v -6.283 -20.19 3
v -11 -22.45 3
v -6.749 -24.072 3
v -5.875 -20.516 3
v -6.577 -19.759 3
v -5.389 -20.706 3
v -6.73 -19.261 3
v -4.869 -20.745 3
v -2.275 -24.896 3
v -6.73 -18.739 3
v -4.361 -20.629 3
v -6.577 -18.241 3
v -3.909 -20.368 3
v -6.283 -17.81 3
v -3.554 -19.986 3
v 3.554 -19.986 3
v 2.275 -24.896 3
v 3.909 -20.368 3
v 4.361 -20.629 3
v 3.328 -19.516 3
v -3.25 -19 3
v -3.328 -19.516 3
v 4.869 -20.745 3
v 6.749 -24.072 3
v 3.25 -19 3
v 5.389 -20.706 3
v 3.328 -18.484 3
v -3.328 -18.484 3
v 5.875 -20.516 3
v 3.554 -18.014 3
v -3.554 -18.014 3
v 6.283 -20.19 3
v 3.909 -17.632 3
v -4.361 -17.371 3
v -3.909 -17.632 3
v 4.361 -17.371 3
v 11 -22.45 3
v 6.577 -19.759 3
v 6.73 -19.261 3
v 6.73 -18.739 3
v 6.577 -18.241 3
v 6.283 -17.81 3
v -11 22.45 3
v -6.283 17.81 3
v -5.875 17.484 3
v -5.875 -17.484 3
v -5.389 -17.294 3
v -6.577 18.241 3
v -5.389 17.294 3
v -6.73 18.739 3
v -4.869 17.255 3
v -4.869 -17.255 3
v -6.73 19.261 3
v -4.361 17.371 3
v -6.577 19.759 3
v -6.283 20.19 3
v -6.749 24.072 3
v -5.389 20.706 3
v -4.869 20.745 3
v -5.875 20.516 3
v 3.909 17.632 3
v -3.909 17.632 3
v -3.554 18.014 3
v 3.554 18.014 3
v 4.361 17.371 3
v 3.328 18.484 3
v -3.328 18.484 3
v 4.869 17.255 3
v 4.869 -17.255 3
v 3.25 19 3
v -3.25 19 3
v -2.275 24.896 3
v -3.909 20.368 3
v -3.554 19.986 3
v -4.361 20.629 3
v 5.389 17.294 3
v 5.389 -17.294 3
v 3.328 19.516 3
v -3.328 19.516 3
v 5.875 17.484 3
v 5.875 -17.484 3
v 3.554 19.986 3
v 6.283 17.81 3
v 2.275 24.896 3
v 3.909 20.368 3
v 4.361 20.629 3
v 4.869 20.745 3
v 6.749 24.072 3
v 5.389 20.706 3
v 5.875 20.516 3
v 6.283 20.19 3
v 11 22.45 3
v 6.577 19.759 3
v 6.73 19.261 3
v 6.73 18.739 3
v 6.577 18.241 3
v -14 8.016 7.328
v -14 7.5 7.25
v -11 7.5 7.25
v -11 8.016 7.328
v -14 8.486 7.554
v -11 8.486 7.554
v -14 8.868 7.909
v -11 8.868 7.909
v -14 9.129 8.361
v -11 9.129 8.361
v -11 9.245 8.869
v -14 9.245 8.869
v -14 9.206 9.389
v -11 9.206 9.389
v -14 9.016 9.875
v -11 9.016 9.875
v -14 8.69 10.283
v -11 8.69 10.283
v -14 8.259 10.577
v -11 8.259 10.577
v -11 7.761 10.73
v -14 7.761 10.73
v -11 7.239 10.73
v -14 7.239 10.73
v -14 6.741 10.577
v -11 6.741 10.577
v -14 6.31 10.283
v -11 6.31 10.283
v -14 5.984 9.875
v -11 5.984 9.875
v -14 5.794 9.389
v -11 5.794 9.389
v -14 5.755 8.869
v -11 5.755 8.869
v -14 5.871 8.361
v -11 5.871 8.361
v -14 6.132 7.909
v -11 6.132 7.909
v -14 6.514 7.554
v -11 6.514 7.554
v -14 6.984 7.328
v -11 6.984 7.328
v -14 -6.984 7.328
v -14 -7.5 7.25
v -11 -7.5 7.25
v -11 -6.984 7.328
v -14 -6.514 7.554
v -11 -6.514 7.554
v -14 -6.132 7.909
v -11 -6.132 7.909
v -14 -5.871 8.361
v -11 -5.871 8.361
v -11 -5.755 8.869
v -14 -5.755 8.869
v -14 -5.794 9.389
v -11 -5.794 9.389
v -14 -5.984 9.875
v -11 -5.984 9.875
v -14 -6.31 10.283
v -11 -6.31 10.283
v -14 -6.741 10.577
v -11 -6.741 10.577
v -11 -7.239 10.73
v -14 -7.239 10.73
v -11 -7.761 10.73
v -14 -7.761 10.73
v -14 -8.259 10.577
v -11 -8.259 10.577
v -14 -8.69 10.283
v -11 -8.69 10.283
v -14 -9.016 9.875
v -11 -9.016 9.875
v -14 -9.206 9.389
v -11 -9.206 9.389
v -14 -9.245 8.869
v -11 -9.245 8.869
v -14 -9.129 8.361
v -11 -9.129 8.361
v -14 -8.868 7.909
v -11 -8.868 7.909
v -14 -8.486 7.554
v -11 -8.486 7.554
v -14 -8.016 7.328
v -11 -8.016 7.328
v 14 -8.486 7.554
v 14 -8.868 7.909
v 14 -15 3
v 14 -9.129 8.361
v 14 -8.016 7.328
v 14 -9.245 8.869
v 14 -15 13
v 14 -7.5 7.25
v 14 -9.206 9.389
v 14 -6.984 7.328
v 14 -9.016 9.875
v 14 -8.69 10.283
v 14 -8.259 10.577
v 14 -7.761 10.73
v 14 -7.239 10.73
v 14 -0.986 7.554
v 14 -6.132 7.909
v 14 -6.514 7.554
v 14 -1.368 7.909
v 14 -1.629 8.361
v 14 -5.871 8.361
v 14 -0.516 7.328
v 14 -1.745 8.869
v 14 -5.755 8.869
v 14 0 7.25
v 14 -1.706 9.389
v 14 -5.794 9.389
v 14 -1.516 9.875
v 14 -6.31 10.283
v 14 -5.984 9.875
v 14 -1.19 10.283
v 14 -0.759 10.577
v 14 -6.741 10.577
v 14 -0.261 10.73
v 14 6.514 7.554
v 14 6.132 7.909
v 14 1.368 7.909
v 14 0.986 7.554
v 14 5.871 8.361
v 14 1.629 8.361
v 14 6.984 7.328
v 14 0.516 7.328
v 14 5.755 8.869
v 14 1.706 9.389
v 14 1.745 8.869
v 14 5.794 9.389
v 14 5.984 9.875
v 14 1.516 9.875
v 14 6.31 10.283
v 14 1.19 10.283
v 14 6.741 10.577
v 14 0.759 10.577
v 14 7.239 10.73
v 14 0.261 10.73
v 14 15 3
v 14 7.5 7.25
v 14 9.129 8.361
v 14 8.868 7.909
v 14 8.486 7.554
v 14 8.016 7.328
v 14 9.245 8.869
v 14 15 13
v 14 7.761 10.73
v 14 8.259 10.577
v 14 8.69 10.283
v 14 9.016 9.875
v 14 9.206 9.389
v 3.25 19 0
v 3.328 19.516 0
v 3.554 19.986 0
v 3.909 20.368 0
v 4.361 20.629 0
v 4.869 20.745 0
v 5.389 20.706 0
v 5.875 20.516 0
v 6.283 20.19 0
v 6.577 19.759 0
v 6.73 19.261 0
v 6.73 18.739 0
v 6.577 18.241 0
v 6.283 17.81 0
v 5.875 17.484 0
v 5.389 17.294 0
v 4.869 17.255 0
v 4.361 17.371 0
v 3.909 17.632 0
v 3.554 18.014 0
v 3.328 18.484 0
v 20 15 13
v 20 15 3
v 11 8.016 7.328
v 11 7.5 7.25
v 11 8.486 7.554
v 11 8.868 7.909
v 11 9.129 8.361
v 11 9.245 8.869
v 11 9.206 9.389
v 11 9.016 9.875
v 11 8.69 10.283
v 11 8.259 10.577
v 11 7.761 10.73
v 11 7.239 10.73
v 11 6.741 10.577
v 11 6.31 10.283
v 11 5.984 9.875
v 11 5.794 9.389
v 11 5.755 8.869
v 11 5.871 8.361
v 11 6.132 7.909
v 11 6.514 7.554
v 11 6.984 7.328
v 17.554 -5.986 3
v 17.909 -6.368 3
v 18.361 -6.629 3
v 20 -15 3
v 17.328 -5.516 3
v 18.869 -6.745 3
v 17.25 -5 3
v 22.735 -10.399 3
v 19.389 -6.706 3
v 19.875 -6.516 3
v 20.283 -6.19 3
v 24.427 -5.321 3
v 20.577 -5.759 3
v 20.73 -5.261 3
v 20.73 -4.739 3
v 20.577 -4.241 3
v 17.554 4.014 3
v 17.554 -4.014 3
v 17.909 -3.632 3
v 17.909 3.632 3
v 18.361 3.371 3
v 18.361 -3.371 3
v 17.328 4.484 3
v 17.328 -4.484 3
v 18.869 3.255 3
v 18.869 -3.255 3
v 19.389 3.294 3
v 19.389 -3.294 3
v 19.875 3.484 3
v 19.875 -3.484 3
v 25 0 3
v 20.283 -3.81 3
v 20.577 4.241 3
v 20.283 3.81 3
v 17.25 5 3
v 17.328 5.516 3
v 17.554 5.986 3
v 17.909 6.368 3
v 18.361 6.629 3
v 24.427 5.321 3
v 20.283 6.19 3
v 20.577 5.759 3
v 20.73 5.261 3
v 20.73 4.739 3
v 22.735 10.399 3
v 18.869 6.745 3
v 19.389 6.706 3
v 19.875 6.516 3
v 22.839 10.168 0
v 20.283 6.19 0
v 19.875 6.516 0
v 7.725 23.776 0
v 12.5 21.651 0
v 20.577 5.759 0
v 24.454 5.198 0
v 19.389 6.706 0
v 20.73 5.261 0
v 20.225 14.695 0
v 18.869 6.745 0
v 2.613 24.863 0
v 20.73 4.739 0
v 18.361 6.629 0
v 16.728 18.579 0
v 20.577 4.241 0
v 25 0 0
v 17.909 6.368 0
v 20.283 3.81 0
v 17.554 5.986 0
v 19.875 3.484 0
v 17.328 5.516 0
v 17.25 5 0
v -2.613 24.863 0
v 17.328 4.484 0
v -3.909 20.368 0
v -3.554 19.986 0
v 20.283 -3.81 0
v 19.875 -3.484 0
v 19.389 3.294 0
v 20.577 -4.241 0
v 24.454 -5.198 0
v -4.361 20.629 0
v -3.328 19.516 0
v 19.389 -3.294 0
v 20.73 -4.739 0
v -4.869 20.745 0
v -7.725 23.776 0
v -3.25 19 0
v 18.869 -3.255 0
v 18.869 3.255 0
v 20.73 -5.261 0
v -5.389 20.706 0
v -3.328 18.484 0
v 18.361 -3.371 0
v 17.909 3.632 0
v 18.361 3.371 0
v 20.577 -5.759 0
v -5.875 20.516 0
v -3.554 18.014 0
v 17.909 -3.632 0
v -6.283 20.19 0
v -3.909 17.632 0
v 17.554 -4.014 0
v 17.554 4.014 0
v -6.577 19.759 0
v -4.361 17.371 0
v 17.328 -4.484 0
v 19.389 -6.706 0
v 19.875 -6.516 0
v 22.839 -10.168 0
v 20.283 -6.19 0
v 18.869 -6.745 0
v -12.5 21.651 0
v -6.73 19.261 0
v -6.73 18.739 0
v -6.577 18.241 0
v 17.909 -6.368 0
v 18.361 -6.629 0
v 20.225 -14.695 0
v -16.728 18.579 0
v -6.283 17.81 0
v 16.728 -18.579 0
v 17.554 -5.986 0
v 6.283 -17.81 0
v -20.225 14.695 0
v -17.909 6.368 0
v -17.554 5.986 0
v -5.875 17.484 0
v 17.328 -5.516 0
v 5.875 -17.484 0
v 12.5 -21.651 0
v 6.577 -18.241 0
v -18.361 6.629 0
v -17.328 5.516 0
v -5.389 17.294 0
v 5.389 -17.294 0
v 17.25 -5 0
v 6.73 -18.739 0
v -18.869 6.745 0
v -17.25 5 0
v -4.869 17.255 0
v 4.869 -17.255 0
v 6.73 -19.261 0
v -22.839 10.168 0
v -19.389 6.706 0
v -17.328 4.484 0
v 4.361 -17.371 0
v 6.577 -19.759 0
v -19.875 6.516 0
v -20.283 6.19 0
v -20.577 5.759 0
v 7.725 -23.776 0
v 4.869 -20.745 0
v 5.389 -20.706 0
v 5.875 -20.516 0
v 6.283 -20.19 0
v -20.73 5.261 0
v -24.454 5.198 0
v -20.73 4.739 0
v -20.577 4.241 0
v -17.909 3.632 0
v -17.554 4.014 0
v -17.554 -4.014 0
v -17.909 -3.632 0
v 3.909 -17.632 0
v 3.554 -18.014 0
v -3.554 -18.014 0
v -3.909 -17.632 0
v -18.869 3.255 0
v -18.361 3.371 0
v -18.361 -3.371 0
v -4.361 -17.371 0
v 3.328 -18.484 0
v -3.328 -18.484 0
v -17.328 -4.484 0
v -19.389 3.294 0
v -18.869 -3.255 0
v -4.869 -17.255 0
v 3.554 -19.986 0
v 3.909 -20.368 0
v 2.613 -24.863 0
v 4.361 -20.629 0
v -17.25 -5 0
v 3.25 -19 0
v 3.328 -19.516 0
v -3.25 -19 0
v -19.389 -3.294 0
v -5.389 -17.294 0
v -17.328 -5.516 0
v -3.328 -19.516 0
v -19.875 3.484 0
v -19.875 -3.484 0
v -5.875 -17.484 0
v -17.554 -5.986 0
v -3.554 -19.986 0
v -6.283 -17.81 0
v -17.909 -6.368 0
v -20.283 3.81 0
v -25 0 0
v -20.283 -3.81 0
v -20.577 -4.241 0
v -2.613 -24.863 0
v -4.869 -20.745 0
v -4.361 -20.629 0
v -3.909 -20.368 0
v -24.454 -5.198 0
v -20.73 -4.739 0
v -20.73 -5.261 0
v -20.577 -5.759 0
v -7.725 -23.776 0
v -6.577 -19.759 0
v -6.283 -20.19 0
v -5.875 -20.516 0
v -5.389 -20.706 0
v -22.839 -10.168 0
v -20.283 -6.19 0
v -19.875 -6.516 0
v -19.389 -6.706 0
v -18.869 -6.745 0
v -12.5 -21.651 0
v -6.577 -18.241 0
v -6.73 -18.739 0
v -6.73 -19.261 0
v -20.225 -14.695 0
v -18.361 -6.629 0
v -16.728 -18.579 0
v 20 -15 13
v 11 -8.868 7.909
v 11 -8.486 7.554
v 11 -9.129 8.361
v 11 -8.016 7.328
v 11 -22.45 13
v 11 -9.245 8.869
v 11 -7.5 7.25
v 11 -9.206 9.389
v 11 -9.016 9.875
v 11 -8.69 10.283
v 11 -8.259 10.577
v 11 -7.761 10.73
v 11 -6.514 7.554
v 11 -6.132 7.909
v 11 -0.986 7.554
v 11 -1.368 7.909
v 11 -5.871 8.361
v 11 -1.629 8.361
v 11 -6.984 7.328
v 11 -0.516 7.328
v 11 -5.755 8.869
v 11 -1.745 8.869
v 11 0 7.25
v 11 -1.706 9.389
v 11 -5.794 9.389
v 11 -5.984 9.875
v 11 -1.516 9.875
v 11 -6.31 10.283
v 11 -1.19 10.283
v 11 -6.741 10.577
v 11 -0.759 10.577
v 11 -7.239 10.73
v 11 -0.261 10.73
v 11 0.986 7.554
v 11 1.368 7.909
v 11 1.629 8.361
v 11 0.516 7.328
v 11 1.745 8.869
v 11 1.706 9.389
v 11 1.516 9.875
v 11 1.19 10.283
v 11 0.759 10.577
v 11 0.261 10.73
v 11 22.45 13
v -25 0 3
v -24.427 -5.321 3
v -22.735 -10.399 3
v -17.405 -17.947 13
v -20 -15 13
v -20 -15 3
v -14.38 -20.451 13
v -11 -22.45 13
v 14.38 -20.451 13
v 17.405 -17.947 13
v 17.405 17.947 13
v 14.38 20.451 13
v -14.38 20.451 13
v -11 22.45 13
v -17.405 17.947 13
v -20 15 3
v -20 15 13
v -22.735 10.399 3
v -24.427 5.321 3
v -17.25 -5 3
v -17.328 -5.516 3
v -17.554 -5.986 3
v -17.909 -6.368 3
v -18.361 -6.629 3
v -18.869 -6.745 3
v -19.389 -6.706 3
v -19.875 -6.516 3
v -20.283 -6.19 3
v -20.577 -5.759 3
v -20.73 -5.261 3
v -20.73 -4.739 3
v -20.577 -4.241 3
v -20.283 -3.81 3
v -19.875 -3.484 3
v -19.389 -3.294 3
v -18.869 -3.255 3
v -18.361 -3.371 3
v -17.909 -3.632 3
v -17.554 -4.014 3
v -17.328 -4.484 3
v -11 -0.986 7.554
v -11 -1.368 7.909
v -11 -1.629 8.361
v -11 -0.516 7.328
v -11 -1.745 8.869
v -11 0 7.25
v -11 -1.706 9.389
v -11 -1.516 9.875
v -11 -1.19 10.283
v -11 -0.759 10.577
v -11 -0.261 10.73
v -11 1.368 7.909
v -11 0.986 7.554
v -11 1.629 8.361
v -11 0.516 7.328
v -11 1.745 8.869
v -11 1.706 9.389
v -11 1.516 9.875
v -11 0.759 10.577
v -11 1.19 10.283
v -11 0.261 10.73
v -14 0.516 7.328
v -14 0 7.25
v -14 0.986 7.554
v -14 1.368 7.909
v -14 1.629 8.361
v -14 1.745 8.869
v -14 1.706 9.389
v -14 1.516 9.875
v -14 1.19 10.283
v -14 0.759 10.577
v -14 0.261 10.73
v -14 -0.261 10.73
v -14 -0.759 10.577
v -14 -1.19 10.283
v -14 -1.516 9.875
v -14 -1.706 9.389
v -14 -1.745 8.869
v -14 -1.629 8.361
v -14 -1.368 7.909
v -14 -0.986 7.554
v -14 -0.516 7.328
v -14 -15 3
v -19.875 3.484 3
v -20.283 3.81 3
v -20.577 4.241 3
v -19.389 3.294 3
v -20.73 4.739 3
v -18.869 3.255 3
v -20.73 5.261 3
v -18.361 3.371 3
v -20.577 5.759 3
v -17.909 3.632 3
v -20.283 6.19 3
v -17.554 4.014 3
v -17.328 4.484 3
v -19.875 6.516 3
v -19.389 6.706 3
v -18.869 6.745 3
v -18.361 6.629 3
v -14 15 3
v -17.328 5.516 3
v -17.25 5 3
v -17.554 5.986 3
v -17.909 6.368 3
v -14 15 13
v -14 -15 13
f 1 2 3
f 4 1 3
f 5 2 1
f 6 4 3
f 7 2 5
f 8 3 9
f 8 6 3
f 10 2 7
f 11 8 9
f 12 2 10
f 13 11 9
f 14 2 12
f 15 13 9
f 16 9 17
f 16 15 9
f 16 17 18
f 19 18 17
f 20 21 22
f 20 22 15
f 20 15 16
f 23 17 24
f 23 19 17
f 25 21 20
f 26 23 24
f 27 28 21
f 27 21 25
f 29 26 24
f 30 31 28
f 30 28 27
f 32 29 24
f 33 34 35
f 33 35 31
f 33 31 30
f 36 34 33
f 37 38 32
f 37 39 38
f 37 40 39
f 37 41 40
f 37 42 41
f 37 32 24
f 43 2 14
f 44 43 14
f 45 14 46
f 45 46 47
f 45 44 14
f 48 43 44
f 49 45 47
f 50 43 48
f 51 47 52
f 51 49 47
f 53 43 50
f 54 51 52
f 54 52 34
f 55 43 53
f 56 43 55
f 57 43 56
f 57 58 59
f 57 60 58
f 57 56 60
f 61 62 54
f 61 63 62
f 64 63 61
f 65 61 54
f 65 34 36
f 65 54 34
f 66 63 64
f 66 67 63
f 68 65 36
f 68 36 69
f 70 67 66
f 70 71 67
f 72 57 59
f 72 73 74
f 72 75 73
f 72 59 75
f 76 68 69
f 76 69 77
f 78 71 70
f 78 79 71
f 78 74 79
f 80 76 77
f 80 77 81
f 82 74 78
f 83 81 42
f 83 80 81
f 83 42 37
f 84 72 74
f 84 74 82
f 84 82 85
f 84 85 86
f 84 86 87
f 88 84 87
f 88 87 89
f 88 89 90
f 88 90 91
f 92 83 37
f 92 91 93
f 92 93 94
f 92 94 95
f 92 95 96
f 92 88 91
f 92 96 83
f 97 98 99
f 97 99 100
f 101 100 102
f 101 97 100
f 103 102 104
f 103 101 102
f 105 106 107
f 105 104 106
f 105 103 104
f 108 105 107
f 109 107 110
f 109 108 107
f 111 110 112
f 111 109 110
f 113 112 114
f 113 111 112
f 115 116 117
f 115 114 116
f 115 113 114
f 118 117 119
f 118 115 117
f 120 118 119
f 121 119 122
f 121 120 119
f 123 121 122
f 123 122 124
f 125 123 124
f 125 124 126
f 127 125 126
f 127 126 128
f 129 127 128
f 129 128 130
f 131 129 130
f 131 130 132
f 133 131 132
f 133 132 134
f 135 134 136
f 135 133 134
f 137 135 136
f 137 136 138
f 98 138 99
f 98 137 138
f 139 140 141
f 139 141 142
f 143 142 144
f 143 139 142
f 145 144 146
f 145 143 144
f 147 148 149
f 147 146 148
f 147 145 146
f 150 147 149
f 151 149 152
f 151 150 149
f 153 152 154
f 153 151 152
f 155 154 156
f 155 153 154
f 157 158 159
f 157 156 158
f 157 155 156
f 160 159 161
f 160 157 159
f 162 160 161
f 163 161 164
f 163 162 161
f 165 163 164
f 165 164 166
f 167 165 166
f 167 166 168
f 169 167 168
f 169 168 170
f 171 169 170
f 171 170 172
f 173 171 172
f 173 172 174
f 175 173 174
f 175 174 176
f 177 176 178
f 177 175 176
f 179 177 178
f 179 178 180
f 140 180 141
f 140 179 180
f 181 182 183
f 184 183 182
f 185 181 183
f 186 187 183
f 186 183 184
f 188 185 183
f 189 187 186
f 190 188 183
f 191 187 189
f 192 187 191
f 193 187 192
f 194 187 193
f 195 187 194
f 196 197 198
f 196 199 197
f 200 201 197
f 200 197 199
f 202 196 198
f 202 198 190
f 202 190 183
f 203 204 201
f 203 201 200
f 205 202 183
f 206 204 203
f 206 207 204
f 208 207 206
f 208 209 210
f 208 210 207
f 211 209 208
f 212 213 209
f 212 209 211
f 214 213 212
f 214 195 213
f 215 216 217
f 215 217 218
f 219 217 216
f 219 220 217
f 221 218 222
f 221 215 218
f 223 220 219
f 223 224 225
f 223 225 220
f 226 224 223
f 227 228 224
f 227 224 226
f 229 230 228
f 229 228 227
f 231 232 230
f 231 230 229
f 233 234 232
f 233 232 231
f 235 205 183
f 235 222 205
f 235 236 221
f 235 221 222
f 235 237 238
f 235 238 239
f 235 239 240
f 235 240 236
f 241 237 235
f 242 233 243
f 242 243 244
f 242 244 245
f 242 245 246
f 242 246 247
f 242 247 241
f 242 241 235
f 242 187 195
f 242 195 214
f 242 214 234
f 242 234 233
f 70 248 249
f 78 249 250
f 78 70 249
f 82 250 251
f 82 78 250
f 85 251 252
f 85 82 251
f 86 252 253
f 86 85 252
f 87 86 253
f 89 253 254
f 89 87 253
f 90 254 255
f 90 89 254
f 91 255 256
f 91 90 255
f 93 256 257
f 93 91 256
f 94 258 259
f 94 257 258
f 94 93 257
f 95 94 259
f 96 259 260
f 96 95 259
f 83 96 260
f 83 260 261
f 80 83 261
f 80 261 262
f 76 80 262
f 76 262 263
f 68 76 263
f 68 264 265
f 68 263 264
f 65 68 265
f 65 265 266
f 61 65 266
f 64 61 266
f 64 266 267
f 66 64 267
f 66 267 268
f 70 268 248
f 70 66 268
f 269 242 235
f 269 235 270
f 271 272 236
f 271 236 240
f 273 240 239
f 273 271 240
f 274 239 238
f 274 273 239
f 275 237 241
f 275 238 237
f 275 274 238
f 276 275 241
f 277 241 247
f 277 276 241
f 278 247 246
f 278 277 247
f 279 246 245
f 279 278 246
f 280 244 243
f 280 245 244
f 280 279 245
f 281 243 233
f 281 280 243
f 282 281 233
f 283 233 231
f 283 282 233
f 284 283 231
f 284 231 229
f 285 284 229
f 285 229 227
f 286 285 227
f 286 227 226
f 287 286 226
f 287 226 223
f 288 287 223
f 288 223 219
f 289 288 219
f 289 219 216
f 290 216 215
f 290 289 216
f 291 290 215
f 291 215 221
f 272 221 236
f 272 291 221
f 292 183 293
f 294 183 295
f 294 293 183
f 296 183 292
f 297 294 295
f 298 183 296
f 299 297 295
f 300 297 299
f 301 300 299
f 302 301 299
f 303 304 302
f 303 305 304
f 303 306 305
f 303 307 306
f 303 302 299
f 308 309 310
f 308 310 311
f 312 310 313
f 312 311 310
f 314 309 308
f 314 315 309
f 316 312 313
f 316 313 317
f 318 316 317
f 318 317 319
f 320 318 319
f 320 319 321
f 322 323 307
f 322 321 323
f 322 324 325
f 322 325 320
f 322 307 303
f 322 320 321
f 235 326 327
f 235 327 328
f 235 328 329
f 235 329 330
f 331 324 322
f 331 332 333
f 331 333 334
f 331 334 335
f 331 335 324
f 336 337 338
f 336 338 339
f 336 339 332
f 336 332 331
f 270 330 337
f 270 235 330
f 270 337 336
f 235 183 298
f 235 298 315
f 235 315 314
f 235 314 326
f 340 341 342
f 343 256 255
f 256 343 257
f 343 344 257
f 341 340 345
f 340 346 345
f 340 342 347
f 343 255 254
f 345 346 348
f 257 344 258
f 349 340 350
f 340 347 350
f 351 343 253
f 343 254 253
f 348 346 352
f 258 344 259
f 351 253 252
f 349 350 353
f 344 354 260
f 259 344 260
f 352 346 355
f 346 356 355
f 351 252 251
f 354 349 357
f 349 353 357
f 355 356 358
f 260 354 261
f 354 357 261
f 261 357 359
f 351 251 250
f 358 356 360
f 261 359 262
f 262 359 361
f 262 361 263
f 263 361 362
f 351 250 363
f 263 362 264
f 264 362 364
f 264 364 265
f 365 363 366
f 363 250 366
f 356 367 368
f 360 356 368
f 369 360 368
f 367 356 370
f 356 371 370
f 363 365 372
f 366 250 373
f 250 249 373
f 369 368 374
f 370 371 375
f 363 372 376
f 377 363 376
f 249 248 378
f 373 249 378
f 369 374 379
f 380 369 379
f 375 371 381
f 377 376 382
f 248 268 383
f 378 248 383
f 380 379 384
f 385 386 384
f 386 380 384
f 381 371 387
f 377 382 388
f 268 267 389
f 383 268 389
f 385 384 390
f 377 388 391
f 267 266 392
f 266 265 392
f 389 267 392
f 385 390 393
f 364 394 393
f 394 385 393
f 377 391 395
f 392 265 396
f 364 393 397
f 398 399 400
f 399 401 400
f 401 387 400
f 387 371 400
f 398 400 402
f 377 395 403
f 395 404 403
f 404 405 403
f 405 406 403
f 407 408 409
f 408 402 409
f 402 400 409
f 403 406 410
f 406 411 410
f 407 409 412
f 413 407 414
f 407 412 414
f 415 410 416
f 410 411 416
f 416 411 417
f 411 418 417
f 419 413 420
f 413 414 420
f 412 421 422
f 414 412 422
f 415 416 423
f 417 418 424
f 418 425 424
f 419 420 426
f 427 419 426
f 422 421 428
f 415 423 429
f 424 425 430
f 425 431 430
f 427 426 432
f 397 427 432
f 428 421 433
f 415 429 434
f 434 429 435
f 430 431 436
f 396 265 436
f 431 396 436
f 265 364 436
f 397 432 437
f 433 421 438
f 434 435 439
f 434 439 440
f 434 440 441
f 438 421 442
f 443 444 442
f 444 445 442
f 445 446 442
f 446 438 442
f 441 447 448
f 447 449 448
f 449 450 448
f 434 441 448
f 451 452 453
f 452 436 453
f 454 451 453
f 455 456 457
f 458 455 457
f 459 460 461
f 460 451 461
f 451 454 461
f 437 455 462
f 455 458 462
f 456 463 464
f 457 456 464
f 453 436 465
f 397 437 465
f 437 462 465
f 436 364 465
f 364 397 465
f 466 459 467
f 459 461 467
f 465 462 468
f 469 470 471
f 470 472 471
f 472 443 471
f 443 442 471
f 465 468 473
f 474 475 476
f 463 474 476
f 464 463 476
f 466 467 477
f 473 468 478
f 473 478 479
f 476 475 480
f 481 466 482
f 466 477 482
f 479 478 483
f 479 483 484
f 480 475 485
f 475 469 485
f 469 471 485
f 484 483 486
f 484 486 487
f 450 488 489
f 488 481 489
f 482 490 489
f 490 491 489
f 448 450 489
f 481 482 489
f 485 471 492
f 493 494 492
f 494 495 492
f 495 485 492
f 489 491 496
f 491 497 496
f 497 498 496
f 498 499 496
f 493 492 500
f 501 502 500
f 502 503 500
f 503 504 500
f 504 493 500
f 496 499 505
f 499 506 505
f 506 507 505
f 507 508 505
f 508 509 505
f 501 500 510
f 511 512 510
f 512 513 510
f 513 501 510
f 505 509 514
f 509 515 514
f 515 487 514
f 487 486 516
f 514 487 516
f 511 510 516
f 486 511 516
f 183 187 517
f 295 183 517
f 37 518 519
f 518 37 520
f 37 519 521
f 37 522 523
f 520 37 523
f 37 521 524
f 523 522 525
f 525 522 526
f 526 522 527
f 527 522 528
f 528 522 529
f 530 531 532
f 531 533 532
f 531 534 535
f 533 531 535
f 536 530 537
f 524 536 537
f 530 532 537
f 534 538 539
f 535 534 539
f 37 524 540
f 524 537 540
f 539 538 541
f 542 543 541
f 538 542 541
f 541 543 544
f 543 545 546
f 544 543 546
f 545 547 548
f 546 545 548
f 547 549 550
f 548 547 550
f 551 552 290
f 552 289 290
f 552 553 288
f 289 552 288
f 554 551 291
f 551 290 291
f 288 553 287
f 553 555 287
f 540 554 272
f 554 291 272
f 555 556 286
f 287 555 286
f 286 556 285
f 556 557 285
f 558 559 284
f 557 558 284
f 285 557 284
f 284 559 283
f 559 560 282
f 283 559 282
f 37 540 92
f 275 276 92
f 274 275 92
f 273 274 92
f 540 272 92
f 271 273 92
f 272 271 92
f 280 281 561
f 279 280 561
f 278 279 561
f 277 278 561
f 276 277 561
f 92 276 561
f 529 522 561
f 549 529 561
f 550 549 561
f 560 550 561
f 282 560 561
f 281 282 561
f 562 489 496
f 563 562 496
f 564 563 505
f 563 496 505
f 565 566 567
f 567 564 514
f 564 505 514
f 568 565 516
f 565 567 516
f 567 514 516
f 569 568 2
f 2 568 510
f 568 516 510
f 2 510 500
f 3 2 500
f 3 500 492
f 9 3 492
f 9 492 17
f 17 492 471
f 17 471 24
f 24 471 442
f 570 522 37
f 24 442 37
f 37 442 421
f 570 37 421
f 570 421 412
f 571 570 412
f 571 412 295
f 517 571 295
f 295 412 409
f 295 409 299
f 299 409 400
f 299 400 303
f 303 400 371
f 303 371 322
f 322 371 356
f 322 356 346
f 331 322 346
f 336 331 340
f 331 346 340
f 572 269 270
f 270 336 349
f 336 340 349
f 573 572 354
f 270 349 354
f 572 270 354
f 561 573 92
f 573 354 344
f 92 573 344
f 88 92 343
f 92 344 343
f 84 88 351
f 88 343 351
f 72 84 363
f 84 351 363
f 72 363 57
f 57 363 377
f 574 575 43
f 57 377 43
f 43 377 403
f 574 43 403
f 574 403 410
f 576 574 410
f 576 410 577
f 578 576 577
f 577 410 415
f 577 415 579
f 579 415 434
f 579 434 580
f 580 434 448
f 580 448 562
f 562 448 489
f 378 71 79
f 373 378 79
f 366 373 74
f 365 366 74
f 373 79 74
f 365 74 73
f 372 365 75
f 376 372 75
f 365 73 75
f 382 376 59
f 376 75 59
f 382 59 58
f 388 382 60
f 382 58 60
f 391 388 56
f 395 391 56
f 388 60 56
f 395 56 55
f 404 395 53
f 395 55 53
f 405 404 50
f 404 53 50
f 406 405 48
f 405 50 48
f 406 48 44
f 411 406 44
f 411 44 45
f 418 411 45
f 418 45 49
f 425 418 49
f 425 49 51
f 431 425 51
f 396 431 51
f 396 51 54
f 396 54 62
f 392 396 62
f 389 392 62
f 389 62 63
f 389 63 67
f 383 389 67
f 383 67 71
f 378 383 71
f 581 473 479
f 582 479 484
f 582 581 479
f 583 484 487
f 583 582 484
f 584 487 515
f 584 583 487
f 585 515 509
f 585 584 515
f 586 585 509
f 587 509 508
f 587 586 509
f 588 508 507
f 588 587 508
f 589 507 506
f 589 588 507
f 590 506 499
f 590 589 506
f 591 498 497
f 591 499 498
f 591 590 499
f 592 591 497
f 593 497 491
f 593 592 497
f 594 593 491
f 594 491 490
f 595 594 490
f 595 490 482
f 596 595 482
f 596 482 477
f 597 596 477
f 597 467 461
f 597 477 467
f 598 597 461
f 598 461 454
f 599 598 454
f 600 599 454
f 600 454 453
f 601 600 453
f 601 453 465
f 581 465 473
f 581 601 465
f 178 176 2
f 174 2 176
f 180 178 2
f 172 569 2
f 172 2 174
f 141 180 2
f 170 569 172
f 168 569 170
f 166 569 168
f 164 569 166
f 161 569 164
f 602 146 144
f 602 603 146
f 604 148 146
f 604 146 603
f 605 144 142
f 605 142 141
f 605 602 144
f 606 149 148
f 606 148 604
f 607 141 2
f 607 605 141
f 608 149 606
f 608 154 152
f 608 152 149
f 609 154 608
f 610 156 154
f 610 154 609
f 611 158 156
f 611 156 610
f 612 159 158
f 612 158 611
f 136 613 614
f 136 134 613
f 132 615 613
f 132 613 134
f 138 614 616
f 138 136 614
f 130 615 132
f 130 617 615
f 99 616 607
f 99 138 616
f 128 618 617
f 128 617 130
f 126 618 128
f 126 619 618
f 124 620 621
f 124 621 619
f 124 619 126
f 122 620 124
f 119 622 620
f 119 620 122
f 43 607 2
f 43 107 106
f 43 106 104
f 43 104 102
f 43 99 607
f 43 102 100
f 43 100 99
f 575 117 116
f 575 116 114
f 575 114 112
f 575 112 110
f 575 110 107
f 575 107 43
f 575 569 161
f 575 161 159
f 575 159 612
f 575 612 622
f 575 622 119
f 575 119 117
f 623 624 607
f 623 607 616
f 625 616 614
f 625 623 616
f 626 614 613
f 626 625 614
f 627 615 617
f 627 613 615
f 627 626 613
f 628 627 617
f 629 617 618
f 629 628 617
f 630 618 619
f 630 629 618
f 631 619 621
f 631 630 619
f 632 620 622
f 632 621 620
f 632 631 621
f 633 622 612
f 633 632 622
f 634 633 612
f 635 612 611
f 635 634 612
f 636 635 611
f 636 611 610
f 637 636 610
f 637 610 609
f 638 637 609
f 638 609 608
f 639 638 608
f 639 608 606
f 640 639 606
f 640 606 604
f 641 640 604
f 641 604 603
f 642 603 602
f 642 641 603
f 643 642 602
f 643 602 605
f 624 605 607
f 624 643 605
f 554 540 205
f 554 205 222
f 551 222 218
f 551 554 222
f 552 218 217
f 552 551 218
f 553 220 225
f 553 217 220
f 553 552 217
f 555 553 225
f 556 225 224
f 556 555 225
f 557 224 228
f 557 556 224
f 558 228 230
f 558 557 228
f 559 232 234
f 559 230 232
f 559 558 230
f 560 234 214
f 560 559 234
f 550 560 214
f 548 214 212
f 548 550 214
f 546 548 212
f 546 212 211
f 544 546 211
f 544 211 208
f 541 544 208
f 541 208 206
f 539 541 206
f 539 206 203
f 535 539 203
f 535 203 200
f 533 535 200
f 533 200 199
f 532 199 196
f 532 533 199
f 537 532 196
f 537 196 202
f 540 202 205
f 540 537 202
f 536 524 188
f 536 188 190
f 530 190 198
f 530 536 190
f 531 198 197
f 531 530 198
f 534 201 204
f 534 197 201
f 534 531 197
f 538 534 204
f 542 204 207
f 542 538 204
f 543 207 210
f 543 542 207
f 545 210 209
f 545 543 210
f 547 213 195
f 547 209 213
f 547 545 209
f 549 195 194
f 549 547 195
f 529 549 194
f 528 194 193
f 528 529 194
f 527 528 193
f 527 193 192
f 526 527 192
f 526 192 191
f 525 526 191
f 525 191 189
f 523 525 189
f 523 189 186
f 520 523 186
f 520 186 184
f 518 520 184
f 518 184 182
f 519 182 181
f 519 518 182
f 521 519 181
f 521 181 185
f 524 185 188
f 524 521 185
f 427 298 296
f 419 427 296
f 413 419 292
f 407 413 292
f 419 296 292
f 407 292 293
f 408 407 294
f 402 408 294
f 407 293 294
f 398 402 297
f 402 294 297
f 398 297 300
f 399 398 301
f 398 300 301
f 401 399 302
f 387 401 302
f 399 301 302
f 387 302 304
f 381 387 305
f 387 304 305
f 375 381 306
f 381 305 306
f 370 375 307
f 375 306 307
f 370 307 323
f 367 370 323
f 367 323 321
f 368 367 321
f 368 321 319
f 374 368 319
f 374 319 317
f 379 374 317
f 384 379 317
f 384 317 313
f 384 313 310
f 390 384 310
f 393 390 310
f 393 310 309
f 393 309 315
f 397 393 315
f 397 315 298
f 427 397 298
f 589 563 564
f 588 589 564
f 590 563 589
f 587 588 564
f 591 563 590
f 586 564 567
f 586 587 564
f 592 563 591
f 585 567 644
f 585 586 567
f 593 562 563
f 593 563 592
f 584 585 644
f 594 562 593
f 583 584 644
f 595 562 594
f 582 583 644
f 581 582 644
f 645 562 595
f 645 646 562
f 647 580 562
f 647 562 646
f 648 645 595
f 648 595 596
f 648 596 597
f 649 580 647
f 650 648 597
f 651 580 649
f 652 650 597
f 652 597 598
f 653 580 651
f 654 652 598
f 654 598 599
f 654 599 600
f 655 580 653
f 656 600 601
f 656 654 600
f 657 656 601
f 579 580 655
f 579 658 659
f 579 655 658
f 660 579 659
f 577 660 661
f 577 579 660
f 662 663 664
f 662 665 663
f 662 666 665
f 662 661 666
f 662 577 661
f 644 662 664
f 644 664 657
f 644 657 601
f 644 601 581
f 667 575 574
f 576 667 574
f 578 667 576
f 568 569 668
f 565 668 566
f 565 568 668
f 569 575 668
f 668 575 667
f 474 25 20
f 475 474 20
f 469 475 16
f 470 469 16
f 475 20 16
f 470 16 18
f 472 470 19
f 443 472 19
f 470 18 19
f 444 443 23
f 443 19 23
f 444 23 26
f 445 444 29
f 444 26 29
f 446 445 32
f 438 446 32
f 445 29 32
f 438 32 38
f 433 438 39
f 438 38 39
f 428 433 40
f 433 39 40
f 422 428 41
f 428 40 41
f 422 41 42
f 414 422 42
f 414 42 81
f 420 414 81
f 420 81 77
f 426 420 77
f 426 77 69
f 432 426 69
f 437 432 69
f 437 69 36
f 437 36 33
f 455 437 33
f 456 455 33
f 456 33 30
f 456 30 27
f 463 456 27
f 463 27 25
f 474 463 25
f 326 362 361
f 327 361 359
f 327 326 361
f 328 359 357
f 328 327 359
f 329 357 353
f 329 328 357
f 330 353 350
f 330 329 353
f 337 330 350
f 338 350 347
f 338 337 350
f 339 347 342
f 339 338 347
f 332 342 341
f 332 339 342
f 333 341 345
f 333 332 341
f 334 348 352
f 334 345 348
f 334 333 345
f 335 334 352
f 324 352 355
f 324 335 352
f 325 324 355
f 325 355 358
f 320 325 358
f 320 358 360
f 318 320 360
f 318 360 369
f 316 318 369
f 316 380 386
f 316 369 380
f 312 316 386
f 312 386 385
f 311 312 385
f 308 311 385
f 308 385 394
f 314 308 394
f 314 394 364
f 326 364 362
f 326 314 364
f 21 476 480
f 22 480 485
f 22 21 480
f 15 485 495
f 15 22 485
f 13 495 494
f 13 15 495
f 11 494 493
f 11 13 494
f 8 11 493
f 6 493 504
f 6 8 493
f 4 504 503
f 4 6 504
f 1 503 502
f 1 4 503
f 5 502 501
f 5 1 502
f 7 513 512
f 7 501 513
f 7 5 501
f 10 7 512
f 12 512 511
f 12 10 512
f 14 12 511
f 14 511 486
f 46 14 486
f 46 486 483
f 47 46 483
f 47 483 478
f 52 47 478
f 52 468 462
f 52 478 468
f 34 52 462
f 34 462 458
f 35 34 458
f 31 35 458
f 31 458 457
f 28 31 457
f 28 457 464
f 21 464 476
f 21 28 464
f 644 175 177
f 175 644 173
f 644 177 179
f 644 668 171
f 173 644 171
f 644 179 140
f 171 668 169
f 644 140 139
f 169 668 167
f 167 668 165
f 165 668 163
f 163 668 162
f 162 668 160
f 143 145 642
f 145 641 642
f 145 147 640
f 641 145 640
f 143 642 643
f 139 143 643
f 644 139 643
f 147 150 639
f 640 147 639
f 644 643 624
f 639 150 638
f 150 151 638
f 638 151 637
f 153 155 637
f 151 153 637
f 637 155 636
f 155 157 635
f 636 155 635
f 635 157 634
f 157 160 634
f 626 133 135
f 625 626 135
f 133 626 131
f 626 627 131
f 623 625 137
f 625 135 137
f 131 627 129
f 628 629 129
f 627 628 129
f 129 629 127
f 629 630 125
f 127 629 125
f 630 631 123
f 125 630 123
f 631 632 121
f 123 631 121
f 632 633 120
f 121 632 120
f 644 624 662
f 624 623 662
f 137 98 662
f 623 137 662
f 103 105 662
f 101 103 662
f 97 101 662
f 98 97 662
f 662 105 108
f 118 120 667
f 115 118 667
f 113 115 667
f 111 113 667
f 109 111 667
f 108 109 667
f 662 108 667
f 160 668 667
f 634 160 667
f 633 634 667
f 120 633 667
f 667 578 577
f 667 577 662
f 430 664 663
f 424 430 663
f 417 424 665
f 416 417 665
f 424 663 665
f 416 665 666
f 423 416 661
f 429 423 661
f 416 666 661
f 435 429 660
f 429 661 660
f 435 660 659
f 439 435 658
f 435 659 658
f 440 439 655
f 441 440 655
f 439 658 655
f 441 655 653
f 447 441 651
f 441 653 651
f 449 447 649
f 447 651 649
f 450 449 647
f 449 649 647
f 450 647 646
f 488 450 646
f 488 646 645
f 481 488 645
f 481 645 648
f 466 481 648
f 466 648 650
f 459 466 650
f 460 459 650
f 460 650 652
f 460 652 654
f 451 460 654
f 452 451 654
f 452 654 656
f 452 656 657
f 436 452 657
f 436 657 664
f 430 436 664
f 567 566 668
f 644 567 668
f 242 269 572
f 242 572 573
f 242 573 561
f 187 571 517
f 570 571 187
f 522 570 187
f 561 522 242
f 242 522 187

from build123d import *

# Parameters (mm, degrees)
SKETCH1_R                                  = 25
BOSS_EXTRUDE1_DEPTH                        = 13
SKETCH3_W                                  = 22
SKETCH3_H                                  = 50
SKETCH3_H_2                                = 30
CUT_EXTRUDE1_DEPTH                         = 10
CUT_EXTRUDE2_DEPTH                         = 38.669616404
CUT_EXTRUDE2_DEPTH_BACK                    = 38.669616404
SKETCH4_R                                  = 1.75
SKETCH5_R                                  = 1.75
CUT_EXTRUDE3_DEPTH                         = 37.742346142
MIRROR1_AT_THE_SECOND_PLANE_COPY_1_SKETC_R = 1.75
MIRROR1_AT_THE_SECOND_PLANE_COPY_1_DEPTH   = 37.742346142


with BuildPart() as part:
    # Sketch1 → Boss-Extrude1 (new body)
    with BuildSketch(Plane.XY):
        with Locations(Location((0, 0, 0), (0, 0, 180))):
            Circle(SKETCH1_R)
    extrude(amount=BOSS_EXTRUDE1_DEPTH)

    # Sketch3 → Cut-Extrude1 (cut)
    with BuildSketch(Plane.XY.offset(13)):
        Rectangle(SKETCH3_W, SKETCH3_H)
        with Locations((25, 0)):
            Rectangle(SKETCH3_W, SKETCH3_H_2)
        with Locations((-25, 0)):
            Rectangle(SKETCH3_W, SKETCH3_H_2)
    extrude(amount=-CUT_EXTRUDE1_DEPTH, mode=Mode.SUBTRACT)

    # Sketch4 → Cut-Extrude2 (cut, two sides: drawn at the far end of the back side and taken through both)
    with BuildSketch(Plane(origin=(0, 0, 0), x_dir=(0, 0, -1), z_dir=(1, 0, 0)).offset(-CUT_EXTRUDE2_DEPTH_BACK)):
        with Locations((-9, 7.5)):
            Circle(SKETCH4_R)
        with Locations((-9, 0)):
            Circle(SKETCH4_R)
        with Locations((-9, -7.5)):
            Circle(SKETCH4_R)
    extrude(amount=CUT_EXTRUDE2_DEPTH + CUT_EXTRUDE2_DEPTH_BACK, mode=Mode.SUBTRACT)

    # Sketch5 → Cut-Extrude3 (cut, through all)
    with BuildSketch(Plane.XY.offset(3)):
        with Locations((-19, 5)):
            Circle(SKETCH5_R)
        with Locations((-5, 19)):
            Circle(SKETCH5_R)
    cut_extrude3 = extrude(amount=-CUT_EXTRUDE3_DEPTH, mode=Mode.SUBTRACT)

    # Mirror1: Cut-Extrude3 across plane
    add(cut_extrude3.mirror(Plane(origin=(0, 0, 0), x_dir=(0, 0, 1), z_dir=(1, 0, 0))), mode=Mode.SUBTRACT)

    # Mirror1 at the second plane: Cut-Extrude3 across plane
    add(cut_extrude3.mirror(Plane.ZX), mode=Mode.SUBTRACT)

    # Mirror1 at the second plane copy 1 sketc → Mirror1 at the second plane copy 1 (cut, through all)
    with BuildSketch(Plane(origin=(0, 0, 3), x_dir=(-1, 0, 0), z_dir=(0, 0, 1))):
        with Locations((-19, 5)):
            Circle(MIRROR1_AT_THE_SECOND_PLANE_COPY_1_SKETC_R)
        with Locations((-5, 19)):
            Circle(MIRROR1_AT_THE_SECOND_PLANE_COPY_1_SKETC_R)
    extrude(amount=-MIRROR1_AT_THE_SECOND_PLANE_COPY_1_DEPTH, mode=Mode.SUBTRACT)


solid = part.part
